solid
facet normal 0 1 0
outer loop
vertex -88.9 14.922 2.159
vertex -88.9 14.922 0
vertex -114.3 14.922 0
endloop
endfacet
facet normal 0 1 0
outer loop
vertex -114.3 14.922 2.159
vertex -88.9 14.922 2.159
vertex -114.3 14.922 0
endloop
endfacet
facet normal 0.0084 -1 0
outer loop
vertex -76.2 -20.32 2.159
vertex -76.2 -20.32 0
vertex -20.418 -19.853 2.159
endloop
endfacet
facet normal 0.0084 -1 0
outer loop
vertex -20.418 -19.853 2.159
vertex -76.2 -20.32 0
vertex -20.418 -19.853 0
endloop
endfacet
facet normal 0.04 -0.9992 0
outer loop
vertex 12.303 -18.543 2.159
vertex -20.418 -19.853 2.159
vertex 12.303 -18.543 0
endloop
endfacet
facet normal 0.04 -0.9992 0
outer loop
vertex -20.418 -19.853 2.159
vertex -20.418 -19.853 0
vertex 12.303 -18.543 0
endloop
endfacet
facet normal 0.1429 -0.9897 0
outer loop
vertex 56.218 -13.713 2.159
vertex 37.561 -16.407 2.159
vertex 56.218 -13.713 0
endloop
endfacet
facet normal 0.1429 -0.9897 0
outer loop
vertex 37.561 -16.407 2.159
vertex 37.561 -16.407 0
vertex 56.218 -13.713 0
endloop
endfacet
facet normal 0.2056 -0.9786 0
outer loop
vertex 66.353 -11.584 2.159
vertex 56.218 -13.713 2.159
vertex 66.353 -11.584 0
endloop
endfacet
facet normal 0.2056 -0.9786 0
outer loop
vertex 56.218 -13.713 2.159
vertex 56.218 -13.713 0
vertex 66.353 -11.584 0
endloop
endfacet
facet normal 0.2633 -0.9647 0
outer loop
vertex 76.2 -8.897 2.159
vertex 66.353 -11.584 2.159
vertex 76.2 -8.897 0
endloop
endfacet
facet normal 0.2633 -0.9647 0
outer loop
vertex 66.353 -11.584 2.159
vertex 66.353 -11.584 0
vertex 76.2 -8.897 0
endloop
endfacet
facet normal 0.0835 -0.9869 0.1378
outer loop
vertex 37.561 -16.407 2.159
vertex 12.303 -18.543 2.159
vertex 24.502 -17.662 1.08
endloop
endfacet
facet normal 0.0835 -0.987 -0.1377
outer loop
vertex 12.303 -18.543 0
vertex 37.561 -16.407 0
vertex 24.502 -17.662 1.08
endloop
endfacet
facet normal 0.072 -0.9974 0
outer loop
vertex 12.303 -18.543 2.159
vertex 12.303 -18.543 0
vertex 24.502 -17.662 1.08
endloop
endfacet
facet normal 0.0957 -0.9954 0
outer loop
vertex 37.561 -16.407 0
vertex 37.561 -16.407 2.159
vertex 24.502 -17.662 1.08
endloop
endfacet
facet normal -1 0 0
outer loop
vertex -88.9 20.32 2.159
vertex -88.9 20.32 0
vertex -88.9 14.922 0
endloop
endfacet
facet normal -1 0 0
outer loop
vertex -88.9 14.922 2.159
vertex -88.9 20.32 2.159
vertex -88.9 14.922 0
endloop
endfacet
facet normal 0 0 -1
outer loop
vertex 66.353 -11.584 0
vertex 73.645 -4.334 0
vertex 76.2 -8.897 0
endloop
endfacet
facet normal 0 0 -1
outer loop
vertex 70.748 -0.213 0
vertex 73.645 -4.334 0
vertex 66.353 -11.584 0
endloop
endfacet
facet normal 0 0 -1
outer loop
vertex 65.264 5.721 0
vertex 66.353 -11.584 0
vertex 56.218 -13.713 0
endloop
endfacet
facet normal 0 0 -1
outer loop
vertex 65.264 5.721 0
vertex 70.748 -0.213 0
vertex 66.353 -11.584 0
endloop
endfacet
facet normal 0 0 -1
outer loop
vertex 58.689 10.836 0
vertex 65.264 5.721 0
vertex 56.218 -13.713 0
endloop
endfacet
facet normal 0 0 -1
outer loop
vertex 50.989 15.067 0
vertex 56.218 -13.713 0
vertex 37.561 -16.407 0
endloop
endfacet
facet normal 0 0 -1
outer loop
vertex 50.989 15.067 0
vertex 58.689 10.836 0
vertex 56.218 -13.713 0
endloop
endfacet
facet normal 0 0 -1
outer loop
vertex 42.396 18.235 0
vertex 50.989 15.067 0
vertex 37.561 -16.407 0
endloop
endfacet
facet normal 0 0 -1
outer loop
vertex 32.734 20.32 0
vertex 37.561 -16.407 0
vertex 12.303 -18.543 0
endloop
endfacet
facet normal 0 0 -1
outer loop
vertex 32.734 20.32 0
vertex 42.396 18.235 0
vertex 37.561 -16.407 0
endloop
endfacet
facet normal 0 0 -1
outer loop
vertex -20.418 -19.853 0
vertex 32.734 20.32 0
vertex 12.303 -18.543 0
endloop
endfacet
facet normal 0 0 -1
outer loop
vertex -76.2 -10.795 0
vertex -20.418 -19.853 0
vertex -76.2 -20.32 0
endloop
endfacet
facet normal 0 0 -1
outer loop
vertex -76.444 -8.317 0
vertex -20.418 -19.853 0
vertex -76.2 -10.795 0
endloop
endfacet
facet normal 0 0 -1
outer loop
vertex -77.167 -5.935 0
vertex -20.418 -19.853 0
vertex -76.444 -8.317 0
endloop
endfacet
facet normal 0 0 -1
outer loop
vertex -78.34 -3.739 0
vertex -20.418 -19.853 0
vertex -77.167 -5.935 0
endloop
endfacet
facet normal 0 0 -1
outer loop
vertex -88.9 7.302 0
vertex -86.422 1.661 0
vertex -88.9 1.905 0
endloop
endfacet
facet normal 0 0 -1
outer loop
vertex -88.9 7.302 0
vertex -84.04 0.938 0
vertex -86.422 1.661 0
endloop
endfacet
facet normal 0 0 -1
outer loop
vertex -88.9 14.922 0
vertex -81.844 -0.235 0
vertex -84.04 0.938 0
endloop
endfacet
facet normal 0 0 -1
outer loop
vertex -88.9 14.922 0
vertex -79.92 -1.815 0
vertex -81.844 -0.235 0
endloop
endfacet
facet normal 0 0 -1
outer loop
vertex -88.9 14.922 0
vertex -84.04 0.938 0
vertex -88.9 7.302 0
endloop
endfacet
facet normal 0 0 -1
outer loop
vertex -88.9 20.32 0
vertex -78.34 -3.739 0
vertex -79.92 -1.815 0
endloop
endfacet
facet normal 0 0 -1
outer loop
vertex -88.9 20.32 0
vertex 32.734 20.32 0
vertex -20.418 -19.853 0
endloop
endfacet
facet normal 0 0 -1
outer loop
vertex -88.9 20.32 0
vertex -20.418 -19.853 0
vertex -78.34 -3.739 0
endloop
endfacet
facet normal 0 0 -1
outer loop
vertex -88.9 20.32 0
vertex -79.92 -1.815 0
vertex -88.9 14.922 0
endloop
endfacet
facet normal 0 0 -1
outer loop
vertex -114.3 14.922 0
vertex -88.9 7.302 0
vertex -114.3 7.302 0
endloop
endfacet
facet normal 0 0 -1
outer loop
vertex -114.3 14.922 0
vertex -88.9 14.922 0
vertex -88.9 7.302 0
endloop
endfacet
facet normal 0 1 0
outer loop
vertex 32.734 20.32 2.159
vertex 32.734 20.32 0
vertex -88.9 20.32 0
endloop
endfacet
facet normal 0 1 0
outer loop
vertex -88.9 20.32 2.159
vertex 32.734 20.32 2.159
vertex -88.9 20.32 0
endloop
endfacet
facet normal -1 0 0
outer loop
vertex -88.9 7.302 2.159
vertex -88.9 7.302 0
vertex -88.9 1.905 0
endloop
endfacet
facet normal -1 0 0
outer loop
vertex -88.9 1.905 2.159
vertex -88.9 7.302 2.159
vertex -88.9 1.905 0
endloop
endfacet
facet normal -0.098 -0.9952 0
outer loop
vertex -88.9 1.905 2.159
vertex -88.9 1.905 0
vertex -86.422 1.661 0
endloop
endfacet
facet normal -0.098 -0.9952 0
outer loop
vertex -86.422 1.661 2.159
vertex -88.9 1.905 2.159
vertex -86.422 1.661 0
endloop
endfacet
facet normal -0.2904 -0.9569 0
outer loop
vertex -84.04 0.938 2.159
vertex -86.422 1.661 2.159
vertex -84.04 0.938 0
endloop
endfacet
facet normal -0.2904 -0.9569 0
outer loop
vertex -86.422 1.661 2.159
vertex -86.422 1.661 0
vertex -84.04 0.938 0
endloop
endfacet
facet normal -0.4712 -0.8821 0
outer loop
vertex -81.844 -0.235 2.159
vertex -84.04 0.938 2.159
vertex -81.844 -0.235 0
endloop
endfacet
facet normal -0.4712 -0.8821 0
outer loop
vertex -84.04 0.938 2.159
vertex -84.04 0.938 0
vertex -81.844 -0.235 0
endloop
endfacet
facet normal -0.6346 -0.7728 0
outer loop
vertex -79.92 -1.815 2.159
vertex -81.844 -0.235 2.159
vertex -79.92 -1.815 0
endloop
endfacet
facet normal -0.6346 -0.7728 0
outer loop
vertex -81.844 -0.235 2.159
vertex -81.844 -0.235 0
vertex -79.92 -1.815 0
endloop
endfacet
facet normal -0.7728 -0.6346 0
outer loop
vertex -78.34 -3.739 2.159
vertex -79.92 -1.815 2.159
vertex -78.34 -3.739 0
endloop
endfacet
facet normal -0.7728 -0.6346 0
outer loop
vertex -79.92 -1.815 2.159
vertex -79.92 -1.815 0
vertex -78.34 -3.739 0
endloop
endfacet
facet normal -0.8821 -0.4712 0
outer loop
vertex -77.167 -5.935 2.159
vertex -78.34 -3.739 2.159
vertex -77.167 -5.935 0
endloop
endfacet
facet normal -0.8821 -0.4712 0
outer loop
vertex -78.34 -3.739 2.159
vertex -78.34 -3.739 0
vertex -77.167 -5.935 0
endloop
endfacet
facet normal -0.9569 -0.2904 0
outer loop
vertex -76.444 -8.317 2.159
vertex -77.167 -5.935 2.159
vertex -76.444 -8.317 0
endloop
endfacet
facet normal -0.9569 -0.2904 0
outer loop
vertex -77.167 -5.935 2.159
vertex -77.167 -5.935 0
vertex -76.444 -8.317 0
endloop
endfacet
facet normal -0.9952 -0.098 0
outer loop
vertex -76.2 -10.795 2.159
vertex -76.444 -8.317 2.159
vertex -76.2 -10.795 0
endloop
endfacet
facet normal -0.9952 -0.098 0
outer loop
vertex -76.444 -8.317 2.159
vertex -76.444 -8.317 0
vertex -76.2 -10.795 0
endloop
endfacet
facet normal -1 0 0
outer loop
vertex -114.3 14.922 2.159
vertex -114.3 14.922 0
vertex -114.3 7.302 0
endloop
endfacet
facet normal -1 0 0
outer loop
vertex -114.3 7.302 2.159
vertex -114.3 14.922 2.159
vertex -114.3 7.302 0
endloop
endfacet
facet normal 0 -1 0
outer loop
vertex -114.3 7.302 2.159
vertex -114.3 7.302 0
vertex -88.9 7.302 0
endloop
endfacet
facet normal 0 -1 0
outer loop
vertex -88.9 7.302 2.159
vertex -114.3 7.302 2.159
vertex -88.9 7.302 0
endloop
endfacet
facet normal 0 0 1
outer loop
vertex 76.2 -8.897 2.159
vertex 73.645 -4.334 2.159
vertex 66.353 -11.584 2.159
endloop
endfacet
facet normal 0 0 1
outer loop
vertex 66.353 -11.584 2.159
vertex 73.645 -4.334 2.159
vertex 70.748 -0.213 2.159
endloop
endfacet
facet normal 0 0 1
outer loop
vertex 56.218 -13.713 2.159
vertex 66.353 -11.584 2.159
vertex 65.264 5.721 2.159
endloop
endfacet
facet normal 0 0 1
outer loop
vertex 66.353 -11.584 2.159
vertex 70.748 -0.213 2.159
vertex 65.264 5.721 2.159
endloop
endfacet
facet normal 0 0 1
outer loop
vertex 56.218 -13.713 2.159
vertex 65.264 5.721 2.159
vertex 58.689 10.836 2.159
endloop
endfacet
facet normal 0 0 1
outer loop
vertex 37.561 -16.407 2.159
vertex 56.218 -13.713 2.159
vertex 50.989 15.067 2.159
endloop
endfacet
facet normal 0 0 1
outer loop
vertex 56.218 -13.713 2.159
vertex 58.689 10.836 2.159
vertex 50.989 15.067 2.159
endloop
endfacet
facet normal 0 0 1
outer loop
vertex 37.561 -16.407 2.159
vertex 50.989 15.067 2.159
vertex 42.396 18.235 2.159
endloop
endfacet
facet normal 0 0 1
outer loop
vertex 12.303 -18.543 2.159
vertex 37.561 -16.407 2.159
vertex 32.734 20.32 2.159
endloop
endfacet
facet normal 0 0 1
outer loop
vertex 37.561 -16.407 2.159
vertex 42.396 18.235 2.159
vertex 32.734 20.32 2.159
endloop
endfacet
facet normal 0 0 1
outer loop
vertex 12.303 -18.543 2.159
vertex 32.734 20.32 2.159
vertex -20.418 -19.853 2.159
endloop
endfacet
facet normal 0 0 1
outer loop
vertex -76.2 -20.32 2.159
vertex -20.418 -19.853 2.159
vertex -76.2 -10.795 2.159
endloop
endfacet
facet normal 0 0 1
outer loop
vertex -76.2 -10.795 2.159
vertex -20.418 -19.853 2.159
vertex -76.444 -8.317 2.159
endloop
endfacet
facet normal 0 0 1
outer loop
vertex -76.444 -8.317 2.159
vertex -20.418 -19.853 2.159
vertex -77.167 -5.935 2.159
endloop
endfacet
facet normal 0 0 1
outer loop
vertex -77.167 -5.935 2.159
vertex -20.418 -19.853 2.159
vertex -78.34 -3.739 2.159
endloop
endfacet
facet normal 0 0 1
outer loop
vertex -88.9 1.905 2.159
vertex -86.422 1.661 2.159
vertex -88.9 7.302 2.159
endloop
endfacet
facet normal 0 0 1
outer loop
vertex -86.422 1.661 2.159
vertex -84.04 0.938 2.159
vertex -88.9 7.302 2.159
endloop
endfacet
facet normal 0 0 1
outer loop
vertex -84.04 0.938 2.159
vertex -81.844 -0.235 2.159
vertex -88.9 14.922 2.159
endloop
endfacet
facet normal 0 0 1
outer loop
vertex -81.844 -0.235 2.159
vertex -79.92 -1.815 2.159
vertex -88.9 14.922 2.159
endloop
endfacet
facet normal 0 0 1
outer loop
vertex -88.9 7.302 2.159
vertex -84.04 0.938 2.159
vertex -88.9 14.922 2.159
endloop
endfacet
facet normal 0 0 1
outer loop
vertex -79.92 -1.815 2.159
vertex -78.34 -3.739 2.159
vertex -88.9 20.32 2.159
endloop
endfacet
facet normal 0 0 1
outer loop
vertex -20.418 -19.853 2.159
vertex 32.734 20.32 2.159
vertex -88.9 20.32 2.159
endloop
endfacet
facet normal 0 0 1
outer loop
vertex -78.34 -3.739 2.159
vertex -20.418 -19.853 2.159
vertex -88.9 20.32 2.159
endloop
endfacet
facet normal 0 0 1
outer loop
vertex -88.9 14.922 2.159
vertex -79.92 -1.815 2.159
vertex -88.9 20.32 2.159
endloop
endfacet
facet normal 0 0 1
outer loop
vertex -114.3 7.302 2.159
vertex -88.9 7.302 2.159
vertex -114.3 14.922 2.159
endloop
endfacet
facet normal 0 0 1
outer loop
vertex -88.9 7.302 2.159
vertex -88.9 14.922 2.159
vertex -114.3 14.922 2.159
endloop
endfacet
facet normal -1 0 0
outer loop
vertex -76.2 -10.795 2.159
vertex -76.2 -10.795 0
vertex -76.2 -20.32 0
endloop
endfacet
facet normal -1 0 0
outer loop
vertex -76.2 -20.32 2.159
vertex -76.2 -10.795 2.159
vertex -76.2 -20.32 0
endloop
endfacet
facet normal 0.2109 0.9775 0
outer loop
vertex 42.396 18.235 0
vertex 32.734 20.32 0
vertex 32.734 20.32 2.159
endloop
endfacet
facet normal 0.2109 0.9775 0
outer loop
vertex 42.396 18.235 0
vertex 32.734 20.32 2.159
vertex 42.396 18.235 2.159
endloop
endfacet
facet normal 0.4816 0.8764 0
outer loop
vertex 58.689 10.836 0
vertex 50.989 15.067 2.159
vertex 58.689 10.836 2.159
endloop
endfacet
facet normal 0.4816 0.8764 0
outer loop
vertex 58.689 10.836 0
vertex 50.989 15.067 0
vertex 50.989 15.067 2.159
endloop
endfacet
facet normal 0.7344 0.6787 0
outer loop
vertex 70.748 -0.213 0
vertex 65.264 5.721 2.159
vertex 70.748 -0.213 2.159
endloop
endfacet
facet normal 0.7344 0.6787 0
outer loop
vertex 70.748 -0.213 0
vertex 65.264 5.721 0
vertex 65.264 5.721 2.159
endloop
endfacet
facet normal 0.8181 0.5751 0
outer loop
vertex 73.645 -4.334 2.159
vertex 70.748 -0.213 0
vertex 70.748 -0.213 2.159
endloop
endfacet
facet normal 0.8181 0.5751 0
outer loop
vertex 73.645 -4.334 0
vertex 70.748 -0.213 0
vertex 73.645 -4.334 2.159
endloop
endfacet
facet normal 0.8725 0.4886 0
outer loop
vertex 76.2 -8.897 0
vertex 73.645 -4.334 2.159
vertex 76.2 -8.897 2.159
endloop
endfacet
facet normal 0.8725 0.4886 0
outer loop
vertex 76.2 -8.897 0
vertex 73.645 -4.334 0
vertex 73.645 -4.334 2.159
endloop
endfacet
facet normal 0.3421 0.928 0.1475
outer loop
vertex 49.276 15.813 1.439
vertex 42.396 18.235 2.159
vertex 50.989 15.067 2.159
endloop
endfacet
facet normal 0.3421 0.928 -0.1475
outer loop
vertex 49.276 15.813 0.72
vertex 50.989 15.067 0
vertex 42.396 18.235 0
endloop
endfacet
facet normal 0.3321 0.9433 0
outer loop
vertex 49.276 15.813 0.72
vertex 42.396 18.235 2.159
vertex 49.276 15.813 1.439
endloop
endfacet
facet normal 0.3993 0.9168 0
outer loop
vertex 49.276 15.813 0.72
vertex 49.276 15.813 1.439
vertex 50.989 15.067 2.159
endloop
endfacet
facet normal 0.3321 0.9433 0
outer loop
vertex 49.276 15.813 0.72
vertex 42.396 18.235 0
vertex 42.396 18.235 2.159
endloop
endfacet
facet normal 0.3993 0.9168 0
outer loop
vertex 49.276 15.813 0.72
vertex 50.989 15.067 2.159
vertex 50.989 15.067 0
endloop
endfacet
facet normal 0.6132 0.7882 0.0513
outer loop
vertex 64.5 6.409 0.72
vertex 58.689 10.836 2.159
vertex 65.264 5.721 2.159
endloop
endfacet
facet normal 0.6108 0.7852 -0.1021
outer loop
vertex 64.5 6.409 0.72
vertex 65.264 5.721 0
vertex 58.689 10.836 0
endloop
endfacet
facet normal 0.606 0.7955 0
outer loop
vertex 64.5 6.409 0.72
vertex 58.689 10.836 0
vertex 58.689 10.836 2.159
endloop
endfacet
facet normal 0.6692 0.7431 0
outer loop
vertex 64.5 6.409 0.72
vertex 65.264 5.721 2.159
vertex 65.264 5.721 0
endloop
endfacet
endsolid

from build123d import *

# Parameters (mm, degrees)
F1_DEPTH = 2.159


with BuildPart() as f1:
    # F0 (on Top) → F1 (new body)
    with BuildSketch(Plane.XY):
        with BuildLine():
            add(Edge.make_bspline(
                [(32.7343828976, 20.32), (49.2011681199, 17.9275516421), (66.9959262013, 9.6941580996), (76.2, -8.8973781094)],
                knots=[0, 0, 0, 0, 52.3728465302, 52.3728465302, 52.3728465302, 52.3728465302], degree=3))
            Line((32.7343828976, 20.32), (-76.2, 20.32))
            Line((-76.2, 20.32), (-88.9, 20.32))
            Line((-88.9, 20.32), (-88.9, 14.9225))
            Line((-88.9, 14.9225), (-114.3, 14.9225))
            Line((-114.3, 14.9225), (-114.3, 7.3025))
            Line((-114.3, 7.3025), (-88.9, 7.3025))
            Line((-88.9, 7.3025), (-88.9, 1.905))
            ThreePointArc((-88.9, 1.905), (-79.9197438789, -1.8147438789), (-76.2, -10.795))
            Line((-76.2, -10.795), (-76.2, -20.32))
            add(Edge.make_bspline(
                [(-76.2, -20.32), (-27.4205083204, -20.32), (18.5684725391, -19.3262068454), (60.0895812138, -13.8769824012), (76.2, -8.8973781094)],
                knots=[0, 0, 0, 0, 0.5808971053, 1, 1, 1, 1], degree=3))
        make_face()
    extrude(amount=F1_DEPTH)


solid = f1.part
